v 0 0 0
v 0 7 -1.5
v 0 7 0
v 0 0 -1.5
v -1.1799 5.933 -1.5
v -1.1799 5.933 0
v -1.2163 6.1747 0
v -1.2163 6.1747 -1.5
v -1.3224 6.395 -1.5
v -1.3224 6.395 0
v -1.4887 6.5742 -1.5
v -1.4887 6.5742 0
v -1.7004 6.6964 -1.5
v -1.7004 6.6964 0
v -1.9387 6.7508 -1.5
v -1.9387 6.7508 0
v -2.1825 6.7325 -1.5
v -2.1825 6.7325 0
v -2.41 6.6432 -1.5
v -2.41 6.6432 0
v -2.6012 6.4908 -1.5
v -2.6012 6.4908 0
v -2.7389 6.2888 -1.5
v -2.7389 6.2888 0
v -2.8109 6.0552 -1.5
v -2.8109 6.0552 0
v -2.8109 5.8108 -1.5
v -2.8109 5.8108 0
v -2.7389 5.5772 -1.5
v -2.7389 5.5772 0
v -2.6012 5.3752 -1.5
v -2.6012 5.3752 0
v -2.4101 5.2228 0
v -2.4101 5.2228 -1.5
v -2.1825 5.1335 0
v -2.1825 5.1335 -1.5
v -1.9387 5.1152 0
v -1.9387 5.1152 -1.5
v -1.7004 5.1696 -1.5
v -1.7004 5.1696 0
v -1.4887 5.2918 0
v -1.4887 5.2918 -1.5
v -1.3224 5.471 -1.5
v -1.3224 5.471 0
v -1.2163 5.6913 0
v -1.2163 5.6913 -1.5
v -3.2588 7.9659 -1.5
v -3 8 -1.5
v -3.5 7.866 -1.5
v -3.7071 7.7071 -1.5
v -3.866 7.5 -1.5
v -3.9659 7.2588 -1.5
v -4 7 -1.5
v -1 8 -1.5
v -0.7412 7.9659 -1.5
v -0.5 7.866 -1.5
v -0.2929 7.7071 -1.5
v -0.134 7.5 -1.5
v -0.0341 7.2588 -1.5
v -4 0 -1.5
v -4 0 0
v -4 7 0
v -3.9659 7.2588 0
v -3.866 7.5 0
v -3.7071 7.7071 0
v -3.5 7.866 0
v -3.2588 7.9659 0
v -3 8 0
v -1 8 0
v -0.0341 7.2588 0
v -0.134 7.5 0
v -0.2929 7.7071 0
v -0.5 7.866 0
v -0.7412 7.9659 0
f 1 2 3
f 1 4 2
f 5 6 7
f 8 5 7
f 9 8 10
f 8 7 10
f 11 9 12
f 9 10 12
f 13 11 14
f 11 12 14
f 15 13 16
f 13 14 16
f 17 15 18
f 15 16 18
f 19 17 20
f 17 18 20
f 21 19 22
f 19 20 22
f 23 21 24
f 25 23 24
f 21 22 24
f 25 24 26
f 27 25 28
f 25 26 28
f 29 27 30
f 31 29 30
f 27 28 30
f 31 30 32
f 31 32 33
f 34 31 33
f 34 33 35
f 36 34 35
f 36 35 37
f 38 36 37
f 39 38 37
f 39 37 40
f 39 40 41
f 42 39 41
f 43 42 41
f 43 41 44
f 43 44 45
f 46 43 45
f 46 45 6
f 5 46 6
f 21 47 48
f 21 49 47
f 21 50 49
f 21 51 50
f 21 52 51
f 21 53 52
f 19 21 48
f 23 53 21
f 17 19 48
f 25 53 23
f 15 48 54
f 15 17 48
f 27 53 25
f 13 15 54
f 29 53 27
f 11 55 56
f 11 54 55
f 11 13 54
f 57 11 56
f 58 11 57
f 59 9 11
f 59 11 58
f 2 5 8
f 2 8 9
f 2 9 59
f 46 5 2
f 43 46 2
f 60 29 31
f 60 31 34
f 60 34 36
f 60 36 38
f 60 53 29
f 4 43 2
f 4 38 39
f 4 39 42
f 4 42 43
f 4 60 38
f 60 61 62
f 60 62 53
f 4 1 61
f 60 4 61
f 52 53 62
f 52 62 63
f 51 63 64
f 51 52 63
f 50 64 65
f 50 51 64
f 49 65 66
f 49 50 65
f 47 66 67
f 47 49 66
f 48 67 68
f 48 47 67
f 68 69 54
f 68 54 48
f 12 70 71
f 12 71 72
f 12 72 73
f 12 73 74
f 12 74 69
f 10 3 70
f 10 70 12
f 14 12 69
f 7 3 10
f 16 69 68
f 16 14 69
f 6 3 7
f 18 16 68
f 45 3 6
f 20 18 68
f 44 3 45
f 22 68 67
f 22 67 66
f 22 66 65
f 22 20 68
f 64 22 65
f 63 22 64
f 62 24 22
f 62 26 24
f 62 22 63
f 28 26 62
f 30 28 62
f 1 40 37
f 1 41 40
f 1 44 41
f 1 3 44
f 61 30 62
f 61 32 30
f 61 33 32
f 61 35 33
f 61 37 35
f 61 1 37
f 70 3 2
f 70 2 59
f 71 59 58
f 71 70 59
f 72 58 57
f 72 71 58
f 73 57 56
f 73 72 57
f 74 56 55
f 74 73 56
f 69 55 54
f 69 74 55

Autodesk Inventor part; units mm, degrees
ref_plane "YZ Plane" through (0, 0, 0) normal (1, 0, 0) x (0, 1, 0)
ref_plane "XZ Plane" through (0, 0, 0) normal (0, 1, 0) x (-1, 0, 0)
ref_plane "XY Plane" through (0, 0, 0) normal (0, 0, 1) x (1, 0, 0)
sketch "スケッチ1" plane through (0, 0, 0) normal (0, 1, 0) x (-1, 0, 0)
  line L0 (0, 0) -> (4, 0)
  line L1 (4, 0) -> (4, -1.5)
  line L2 (4, -1.5) -> (0, -1.5)
  line L3 (0, -1.5) -> (0, 0)
  dimension "d0" = 4
  dimension "d1" = 1.5
extrude "押し出し1" add sketch "スケッチ1" along normal blind 8
sketch "スケッチ2" plane through (-4, 0, 0) normal (0, 0, 1) x (1, 0, 0)
  circle A0 centre (2, 5.933) radius 0.8201
  line L0 (0, 0) -> (0, 8) projected
  point P0 (4, 0)
  dimension "d4" = 2
extrude "押し出し2" cut sketch "スケッチ2" against normal blind 8
fillet "フィレット1" radius 1 2 edges at (0, 8, -0.75) (-4, 8, -0.75)
properties part number "モーター端子"
